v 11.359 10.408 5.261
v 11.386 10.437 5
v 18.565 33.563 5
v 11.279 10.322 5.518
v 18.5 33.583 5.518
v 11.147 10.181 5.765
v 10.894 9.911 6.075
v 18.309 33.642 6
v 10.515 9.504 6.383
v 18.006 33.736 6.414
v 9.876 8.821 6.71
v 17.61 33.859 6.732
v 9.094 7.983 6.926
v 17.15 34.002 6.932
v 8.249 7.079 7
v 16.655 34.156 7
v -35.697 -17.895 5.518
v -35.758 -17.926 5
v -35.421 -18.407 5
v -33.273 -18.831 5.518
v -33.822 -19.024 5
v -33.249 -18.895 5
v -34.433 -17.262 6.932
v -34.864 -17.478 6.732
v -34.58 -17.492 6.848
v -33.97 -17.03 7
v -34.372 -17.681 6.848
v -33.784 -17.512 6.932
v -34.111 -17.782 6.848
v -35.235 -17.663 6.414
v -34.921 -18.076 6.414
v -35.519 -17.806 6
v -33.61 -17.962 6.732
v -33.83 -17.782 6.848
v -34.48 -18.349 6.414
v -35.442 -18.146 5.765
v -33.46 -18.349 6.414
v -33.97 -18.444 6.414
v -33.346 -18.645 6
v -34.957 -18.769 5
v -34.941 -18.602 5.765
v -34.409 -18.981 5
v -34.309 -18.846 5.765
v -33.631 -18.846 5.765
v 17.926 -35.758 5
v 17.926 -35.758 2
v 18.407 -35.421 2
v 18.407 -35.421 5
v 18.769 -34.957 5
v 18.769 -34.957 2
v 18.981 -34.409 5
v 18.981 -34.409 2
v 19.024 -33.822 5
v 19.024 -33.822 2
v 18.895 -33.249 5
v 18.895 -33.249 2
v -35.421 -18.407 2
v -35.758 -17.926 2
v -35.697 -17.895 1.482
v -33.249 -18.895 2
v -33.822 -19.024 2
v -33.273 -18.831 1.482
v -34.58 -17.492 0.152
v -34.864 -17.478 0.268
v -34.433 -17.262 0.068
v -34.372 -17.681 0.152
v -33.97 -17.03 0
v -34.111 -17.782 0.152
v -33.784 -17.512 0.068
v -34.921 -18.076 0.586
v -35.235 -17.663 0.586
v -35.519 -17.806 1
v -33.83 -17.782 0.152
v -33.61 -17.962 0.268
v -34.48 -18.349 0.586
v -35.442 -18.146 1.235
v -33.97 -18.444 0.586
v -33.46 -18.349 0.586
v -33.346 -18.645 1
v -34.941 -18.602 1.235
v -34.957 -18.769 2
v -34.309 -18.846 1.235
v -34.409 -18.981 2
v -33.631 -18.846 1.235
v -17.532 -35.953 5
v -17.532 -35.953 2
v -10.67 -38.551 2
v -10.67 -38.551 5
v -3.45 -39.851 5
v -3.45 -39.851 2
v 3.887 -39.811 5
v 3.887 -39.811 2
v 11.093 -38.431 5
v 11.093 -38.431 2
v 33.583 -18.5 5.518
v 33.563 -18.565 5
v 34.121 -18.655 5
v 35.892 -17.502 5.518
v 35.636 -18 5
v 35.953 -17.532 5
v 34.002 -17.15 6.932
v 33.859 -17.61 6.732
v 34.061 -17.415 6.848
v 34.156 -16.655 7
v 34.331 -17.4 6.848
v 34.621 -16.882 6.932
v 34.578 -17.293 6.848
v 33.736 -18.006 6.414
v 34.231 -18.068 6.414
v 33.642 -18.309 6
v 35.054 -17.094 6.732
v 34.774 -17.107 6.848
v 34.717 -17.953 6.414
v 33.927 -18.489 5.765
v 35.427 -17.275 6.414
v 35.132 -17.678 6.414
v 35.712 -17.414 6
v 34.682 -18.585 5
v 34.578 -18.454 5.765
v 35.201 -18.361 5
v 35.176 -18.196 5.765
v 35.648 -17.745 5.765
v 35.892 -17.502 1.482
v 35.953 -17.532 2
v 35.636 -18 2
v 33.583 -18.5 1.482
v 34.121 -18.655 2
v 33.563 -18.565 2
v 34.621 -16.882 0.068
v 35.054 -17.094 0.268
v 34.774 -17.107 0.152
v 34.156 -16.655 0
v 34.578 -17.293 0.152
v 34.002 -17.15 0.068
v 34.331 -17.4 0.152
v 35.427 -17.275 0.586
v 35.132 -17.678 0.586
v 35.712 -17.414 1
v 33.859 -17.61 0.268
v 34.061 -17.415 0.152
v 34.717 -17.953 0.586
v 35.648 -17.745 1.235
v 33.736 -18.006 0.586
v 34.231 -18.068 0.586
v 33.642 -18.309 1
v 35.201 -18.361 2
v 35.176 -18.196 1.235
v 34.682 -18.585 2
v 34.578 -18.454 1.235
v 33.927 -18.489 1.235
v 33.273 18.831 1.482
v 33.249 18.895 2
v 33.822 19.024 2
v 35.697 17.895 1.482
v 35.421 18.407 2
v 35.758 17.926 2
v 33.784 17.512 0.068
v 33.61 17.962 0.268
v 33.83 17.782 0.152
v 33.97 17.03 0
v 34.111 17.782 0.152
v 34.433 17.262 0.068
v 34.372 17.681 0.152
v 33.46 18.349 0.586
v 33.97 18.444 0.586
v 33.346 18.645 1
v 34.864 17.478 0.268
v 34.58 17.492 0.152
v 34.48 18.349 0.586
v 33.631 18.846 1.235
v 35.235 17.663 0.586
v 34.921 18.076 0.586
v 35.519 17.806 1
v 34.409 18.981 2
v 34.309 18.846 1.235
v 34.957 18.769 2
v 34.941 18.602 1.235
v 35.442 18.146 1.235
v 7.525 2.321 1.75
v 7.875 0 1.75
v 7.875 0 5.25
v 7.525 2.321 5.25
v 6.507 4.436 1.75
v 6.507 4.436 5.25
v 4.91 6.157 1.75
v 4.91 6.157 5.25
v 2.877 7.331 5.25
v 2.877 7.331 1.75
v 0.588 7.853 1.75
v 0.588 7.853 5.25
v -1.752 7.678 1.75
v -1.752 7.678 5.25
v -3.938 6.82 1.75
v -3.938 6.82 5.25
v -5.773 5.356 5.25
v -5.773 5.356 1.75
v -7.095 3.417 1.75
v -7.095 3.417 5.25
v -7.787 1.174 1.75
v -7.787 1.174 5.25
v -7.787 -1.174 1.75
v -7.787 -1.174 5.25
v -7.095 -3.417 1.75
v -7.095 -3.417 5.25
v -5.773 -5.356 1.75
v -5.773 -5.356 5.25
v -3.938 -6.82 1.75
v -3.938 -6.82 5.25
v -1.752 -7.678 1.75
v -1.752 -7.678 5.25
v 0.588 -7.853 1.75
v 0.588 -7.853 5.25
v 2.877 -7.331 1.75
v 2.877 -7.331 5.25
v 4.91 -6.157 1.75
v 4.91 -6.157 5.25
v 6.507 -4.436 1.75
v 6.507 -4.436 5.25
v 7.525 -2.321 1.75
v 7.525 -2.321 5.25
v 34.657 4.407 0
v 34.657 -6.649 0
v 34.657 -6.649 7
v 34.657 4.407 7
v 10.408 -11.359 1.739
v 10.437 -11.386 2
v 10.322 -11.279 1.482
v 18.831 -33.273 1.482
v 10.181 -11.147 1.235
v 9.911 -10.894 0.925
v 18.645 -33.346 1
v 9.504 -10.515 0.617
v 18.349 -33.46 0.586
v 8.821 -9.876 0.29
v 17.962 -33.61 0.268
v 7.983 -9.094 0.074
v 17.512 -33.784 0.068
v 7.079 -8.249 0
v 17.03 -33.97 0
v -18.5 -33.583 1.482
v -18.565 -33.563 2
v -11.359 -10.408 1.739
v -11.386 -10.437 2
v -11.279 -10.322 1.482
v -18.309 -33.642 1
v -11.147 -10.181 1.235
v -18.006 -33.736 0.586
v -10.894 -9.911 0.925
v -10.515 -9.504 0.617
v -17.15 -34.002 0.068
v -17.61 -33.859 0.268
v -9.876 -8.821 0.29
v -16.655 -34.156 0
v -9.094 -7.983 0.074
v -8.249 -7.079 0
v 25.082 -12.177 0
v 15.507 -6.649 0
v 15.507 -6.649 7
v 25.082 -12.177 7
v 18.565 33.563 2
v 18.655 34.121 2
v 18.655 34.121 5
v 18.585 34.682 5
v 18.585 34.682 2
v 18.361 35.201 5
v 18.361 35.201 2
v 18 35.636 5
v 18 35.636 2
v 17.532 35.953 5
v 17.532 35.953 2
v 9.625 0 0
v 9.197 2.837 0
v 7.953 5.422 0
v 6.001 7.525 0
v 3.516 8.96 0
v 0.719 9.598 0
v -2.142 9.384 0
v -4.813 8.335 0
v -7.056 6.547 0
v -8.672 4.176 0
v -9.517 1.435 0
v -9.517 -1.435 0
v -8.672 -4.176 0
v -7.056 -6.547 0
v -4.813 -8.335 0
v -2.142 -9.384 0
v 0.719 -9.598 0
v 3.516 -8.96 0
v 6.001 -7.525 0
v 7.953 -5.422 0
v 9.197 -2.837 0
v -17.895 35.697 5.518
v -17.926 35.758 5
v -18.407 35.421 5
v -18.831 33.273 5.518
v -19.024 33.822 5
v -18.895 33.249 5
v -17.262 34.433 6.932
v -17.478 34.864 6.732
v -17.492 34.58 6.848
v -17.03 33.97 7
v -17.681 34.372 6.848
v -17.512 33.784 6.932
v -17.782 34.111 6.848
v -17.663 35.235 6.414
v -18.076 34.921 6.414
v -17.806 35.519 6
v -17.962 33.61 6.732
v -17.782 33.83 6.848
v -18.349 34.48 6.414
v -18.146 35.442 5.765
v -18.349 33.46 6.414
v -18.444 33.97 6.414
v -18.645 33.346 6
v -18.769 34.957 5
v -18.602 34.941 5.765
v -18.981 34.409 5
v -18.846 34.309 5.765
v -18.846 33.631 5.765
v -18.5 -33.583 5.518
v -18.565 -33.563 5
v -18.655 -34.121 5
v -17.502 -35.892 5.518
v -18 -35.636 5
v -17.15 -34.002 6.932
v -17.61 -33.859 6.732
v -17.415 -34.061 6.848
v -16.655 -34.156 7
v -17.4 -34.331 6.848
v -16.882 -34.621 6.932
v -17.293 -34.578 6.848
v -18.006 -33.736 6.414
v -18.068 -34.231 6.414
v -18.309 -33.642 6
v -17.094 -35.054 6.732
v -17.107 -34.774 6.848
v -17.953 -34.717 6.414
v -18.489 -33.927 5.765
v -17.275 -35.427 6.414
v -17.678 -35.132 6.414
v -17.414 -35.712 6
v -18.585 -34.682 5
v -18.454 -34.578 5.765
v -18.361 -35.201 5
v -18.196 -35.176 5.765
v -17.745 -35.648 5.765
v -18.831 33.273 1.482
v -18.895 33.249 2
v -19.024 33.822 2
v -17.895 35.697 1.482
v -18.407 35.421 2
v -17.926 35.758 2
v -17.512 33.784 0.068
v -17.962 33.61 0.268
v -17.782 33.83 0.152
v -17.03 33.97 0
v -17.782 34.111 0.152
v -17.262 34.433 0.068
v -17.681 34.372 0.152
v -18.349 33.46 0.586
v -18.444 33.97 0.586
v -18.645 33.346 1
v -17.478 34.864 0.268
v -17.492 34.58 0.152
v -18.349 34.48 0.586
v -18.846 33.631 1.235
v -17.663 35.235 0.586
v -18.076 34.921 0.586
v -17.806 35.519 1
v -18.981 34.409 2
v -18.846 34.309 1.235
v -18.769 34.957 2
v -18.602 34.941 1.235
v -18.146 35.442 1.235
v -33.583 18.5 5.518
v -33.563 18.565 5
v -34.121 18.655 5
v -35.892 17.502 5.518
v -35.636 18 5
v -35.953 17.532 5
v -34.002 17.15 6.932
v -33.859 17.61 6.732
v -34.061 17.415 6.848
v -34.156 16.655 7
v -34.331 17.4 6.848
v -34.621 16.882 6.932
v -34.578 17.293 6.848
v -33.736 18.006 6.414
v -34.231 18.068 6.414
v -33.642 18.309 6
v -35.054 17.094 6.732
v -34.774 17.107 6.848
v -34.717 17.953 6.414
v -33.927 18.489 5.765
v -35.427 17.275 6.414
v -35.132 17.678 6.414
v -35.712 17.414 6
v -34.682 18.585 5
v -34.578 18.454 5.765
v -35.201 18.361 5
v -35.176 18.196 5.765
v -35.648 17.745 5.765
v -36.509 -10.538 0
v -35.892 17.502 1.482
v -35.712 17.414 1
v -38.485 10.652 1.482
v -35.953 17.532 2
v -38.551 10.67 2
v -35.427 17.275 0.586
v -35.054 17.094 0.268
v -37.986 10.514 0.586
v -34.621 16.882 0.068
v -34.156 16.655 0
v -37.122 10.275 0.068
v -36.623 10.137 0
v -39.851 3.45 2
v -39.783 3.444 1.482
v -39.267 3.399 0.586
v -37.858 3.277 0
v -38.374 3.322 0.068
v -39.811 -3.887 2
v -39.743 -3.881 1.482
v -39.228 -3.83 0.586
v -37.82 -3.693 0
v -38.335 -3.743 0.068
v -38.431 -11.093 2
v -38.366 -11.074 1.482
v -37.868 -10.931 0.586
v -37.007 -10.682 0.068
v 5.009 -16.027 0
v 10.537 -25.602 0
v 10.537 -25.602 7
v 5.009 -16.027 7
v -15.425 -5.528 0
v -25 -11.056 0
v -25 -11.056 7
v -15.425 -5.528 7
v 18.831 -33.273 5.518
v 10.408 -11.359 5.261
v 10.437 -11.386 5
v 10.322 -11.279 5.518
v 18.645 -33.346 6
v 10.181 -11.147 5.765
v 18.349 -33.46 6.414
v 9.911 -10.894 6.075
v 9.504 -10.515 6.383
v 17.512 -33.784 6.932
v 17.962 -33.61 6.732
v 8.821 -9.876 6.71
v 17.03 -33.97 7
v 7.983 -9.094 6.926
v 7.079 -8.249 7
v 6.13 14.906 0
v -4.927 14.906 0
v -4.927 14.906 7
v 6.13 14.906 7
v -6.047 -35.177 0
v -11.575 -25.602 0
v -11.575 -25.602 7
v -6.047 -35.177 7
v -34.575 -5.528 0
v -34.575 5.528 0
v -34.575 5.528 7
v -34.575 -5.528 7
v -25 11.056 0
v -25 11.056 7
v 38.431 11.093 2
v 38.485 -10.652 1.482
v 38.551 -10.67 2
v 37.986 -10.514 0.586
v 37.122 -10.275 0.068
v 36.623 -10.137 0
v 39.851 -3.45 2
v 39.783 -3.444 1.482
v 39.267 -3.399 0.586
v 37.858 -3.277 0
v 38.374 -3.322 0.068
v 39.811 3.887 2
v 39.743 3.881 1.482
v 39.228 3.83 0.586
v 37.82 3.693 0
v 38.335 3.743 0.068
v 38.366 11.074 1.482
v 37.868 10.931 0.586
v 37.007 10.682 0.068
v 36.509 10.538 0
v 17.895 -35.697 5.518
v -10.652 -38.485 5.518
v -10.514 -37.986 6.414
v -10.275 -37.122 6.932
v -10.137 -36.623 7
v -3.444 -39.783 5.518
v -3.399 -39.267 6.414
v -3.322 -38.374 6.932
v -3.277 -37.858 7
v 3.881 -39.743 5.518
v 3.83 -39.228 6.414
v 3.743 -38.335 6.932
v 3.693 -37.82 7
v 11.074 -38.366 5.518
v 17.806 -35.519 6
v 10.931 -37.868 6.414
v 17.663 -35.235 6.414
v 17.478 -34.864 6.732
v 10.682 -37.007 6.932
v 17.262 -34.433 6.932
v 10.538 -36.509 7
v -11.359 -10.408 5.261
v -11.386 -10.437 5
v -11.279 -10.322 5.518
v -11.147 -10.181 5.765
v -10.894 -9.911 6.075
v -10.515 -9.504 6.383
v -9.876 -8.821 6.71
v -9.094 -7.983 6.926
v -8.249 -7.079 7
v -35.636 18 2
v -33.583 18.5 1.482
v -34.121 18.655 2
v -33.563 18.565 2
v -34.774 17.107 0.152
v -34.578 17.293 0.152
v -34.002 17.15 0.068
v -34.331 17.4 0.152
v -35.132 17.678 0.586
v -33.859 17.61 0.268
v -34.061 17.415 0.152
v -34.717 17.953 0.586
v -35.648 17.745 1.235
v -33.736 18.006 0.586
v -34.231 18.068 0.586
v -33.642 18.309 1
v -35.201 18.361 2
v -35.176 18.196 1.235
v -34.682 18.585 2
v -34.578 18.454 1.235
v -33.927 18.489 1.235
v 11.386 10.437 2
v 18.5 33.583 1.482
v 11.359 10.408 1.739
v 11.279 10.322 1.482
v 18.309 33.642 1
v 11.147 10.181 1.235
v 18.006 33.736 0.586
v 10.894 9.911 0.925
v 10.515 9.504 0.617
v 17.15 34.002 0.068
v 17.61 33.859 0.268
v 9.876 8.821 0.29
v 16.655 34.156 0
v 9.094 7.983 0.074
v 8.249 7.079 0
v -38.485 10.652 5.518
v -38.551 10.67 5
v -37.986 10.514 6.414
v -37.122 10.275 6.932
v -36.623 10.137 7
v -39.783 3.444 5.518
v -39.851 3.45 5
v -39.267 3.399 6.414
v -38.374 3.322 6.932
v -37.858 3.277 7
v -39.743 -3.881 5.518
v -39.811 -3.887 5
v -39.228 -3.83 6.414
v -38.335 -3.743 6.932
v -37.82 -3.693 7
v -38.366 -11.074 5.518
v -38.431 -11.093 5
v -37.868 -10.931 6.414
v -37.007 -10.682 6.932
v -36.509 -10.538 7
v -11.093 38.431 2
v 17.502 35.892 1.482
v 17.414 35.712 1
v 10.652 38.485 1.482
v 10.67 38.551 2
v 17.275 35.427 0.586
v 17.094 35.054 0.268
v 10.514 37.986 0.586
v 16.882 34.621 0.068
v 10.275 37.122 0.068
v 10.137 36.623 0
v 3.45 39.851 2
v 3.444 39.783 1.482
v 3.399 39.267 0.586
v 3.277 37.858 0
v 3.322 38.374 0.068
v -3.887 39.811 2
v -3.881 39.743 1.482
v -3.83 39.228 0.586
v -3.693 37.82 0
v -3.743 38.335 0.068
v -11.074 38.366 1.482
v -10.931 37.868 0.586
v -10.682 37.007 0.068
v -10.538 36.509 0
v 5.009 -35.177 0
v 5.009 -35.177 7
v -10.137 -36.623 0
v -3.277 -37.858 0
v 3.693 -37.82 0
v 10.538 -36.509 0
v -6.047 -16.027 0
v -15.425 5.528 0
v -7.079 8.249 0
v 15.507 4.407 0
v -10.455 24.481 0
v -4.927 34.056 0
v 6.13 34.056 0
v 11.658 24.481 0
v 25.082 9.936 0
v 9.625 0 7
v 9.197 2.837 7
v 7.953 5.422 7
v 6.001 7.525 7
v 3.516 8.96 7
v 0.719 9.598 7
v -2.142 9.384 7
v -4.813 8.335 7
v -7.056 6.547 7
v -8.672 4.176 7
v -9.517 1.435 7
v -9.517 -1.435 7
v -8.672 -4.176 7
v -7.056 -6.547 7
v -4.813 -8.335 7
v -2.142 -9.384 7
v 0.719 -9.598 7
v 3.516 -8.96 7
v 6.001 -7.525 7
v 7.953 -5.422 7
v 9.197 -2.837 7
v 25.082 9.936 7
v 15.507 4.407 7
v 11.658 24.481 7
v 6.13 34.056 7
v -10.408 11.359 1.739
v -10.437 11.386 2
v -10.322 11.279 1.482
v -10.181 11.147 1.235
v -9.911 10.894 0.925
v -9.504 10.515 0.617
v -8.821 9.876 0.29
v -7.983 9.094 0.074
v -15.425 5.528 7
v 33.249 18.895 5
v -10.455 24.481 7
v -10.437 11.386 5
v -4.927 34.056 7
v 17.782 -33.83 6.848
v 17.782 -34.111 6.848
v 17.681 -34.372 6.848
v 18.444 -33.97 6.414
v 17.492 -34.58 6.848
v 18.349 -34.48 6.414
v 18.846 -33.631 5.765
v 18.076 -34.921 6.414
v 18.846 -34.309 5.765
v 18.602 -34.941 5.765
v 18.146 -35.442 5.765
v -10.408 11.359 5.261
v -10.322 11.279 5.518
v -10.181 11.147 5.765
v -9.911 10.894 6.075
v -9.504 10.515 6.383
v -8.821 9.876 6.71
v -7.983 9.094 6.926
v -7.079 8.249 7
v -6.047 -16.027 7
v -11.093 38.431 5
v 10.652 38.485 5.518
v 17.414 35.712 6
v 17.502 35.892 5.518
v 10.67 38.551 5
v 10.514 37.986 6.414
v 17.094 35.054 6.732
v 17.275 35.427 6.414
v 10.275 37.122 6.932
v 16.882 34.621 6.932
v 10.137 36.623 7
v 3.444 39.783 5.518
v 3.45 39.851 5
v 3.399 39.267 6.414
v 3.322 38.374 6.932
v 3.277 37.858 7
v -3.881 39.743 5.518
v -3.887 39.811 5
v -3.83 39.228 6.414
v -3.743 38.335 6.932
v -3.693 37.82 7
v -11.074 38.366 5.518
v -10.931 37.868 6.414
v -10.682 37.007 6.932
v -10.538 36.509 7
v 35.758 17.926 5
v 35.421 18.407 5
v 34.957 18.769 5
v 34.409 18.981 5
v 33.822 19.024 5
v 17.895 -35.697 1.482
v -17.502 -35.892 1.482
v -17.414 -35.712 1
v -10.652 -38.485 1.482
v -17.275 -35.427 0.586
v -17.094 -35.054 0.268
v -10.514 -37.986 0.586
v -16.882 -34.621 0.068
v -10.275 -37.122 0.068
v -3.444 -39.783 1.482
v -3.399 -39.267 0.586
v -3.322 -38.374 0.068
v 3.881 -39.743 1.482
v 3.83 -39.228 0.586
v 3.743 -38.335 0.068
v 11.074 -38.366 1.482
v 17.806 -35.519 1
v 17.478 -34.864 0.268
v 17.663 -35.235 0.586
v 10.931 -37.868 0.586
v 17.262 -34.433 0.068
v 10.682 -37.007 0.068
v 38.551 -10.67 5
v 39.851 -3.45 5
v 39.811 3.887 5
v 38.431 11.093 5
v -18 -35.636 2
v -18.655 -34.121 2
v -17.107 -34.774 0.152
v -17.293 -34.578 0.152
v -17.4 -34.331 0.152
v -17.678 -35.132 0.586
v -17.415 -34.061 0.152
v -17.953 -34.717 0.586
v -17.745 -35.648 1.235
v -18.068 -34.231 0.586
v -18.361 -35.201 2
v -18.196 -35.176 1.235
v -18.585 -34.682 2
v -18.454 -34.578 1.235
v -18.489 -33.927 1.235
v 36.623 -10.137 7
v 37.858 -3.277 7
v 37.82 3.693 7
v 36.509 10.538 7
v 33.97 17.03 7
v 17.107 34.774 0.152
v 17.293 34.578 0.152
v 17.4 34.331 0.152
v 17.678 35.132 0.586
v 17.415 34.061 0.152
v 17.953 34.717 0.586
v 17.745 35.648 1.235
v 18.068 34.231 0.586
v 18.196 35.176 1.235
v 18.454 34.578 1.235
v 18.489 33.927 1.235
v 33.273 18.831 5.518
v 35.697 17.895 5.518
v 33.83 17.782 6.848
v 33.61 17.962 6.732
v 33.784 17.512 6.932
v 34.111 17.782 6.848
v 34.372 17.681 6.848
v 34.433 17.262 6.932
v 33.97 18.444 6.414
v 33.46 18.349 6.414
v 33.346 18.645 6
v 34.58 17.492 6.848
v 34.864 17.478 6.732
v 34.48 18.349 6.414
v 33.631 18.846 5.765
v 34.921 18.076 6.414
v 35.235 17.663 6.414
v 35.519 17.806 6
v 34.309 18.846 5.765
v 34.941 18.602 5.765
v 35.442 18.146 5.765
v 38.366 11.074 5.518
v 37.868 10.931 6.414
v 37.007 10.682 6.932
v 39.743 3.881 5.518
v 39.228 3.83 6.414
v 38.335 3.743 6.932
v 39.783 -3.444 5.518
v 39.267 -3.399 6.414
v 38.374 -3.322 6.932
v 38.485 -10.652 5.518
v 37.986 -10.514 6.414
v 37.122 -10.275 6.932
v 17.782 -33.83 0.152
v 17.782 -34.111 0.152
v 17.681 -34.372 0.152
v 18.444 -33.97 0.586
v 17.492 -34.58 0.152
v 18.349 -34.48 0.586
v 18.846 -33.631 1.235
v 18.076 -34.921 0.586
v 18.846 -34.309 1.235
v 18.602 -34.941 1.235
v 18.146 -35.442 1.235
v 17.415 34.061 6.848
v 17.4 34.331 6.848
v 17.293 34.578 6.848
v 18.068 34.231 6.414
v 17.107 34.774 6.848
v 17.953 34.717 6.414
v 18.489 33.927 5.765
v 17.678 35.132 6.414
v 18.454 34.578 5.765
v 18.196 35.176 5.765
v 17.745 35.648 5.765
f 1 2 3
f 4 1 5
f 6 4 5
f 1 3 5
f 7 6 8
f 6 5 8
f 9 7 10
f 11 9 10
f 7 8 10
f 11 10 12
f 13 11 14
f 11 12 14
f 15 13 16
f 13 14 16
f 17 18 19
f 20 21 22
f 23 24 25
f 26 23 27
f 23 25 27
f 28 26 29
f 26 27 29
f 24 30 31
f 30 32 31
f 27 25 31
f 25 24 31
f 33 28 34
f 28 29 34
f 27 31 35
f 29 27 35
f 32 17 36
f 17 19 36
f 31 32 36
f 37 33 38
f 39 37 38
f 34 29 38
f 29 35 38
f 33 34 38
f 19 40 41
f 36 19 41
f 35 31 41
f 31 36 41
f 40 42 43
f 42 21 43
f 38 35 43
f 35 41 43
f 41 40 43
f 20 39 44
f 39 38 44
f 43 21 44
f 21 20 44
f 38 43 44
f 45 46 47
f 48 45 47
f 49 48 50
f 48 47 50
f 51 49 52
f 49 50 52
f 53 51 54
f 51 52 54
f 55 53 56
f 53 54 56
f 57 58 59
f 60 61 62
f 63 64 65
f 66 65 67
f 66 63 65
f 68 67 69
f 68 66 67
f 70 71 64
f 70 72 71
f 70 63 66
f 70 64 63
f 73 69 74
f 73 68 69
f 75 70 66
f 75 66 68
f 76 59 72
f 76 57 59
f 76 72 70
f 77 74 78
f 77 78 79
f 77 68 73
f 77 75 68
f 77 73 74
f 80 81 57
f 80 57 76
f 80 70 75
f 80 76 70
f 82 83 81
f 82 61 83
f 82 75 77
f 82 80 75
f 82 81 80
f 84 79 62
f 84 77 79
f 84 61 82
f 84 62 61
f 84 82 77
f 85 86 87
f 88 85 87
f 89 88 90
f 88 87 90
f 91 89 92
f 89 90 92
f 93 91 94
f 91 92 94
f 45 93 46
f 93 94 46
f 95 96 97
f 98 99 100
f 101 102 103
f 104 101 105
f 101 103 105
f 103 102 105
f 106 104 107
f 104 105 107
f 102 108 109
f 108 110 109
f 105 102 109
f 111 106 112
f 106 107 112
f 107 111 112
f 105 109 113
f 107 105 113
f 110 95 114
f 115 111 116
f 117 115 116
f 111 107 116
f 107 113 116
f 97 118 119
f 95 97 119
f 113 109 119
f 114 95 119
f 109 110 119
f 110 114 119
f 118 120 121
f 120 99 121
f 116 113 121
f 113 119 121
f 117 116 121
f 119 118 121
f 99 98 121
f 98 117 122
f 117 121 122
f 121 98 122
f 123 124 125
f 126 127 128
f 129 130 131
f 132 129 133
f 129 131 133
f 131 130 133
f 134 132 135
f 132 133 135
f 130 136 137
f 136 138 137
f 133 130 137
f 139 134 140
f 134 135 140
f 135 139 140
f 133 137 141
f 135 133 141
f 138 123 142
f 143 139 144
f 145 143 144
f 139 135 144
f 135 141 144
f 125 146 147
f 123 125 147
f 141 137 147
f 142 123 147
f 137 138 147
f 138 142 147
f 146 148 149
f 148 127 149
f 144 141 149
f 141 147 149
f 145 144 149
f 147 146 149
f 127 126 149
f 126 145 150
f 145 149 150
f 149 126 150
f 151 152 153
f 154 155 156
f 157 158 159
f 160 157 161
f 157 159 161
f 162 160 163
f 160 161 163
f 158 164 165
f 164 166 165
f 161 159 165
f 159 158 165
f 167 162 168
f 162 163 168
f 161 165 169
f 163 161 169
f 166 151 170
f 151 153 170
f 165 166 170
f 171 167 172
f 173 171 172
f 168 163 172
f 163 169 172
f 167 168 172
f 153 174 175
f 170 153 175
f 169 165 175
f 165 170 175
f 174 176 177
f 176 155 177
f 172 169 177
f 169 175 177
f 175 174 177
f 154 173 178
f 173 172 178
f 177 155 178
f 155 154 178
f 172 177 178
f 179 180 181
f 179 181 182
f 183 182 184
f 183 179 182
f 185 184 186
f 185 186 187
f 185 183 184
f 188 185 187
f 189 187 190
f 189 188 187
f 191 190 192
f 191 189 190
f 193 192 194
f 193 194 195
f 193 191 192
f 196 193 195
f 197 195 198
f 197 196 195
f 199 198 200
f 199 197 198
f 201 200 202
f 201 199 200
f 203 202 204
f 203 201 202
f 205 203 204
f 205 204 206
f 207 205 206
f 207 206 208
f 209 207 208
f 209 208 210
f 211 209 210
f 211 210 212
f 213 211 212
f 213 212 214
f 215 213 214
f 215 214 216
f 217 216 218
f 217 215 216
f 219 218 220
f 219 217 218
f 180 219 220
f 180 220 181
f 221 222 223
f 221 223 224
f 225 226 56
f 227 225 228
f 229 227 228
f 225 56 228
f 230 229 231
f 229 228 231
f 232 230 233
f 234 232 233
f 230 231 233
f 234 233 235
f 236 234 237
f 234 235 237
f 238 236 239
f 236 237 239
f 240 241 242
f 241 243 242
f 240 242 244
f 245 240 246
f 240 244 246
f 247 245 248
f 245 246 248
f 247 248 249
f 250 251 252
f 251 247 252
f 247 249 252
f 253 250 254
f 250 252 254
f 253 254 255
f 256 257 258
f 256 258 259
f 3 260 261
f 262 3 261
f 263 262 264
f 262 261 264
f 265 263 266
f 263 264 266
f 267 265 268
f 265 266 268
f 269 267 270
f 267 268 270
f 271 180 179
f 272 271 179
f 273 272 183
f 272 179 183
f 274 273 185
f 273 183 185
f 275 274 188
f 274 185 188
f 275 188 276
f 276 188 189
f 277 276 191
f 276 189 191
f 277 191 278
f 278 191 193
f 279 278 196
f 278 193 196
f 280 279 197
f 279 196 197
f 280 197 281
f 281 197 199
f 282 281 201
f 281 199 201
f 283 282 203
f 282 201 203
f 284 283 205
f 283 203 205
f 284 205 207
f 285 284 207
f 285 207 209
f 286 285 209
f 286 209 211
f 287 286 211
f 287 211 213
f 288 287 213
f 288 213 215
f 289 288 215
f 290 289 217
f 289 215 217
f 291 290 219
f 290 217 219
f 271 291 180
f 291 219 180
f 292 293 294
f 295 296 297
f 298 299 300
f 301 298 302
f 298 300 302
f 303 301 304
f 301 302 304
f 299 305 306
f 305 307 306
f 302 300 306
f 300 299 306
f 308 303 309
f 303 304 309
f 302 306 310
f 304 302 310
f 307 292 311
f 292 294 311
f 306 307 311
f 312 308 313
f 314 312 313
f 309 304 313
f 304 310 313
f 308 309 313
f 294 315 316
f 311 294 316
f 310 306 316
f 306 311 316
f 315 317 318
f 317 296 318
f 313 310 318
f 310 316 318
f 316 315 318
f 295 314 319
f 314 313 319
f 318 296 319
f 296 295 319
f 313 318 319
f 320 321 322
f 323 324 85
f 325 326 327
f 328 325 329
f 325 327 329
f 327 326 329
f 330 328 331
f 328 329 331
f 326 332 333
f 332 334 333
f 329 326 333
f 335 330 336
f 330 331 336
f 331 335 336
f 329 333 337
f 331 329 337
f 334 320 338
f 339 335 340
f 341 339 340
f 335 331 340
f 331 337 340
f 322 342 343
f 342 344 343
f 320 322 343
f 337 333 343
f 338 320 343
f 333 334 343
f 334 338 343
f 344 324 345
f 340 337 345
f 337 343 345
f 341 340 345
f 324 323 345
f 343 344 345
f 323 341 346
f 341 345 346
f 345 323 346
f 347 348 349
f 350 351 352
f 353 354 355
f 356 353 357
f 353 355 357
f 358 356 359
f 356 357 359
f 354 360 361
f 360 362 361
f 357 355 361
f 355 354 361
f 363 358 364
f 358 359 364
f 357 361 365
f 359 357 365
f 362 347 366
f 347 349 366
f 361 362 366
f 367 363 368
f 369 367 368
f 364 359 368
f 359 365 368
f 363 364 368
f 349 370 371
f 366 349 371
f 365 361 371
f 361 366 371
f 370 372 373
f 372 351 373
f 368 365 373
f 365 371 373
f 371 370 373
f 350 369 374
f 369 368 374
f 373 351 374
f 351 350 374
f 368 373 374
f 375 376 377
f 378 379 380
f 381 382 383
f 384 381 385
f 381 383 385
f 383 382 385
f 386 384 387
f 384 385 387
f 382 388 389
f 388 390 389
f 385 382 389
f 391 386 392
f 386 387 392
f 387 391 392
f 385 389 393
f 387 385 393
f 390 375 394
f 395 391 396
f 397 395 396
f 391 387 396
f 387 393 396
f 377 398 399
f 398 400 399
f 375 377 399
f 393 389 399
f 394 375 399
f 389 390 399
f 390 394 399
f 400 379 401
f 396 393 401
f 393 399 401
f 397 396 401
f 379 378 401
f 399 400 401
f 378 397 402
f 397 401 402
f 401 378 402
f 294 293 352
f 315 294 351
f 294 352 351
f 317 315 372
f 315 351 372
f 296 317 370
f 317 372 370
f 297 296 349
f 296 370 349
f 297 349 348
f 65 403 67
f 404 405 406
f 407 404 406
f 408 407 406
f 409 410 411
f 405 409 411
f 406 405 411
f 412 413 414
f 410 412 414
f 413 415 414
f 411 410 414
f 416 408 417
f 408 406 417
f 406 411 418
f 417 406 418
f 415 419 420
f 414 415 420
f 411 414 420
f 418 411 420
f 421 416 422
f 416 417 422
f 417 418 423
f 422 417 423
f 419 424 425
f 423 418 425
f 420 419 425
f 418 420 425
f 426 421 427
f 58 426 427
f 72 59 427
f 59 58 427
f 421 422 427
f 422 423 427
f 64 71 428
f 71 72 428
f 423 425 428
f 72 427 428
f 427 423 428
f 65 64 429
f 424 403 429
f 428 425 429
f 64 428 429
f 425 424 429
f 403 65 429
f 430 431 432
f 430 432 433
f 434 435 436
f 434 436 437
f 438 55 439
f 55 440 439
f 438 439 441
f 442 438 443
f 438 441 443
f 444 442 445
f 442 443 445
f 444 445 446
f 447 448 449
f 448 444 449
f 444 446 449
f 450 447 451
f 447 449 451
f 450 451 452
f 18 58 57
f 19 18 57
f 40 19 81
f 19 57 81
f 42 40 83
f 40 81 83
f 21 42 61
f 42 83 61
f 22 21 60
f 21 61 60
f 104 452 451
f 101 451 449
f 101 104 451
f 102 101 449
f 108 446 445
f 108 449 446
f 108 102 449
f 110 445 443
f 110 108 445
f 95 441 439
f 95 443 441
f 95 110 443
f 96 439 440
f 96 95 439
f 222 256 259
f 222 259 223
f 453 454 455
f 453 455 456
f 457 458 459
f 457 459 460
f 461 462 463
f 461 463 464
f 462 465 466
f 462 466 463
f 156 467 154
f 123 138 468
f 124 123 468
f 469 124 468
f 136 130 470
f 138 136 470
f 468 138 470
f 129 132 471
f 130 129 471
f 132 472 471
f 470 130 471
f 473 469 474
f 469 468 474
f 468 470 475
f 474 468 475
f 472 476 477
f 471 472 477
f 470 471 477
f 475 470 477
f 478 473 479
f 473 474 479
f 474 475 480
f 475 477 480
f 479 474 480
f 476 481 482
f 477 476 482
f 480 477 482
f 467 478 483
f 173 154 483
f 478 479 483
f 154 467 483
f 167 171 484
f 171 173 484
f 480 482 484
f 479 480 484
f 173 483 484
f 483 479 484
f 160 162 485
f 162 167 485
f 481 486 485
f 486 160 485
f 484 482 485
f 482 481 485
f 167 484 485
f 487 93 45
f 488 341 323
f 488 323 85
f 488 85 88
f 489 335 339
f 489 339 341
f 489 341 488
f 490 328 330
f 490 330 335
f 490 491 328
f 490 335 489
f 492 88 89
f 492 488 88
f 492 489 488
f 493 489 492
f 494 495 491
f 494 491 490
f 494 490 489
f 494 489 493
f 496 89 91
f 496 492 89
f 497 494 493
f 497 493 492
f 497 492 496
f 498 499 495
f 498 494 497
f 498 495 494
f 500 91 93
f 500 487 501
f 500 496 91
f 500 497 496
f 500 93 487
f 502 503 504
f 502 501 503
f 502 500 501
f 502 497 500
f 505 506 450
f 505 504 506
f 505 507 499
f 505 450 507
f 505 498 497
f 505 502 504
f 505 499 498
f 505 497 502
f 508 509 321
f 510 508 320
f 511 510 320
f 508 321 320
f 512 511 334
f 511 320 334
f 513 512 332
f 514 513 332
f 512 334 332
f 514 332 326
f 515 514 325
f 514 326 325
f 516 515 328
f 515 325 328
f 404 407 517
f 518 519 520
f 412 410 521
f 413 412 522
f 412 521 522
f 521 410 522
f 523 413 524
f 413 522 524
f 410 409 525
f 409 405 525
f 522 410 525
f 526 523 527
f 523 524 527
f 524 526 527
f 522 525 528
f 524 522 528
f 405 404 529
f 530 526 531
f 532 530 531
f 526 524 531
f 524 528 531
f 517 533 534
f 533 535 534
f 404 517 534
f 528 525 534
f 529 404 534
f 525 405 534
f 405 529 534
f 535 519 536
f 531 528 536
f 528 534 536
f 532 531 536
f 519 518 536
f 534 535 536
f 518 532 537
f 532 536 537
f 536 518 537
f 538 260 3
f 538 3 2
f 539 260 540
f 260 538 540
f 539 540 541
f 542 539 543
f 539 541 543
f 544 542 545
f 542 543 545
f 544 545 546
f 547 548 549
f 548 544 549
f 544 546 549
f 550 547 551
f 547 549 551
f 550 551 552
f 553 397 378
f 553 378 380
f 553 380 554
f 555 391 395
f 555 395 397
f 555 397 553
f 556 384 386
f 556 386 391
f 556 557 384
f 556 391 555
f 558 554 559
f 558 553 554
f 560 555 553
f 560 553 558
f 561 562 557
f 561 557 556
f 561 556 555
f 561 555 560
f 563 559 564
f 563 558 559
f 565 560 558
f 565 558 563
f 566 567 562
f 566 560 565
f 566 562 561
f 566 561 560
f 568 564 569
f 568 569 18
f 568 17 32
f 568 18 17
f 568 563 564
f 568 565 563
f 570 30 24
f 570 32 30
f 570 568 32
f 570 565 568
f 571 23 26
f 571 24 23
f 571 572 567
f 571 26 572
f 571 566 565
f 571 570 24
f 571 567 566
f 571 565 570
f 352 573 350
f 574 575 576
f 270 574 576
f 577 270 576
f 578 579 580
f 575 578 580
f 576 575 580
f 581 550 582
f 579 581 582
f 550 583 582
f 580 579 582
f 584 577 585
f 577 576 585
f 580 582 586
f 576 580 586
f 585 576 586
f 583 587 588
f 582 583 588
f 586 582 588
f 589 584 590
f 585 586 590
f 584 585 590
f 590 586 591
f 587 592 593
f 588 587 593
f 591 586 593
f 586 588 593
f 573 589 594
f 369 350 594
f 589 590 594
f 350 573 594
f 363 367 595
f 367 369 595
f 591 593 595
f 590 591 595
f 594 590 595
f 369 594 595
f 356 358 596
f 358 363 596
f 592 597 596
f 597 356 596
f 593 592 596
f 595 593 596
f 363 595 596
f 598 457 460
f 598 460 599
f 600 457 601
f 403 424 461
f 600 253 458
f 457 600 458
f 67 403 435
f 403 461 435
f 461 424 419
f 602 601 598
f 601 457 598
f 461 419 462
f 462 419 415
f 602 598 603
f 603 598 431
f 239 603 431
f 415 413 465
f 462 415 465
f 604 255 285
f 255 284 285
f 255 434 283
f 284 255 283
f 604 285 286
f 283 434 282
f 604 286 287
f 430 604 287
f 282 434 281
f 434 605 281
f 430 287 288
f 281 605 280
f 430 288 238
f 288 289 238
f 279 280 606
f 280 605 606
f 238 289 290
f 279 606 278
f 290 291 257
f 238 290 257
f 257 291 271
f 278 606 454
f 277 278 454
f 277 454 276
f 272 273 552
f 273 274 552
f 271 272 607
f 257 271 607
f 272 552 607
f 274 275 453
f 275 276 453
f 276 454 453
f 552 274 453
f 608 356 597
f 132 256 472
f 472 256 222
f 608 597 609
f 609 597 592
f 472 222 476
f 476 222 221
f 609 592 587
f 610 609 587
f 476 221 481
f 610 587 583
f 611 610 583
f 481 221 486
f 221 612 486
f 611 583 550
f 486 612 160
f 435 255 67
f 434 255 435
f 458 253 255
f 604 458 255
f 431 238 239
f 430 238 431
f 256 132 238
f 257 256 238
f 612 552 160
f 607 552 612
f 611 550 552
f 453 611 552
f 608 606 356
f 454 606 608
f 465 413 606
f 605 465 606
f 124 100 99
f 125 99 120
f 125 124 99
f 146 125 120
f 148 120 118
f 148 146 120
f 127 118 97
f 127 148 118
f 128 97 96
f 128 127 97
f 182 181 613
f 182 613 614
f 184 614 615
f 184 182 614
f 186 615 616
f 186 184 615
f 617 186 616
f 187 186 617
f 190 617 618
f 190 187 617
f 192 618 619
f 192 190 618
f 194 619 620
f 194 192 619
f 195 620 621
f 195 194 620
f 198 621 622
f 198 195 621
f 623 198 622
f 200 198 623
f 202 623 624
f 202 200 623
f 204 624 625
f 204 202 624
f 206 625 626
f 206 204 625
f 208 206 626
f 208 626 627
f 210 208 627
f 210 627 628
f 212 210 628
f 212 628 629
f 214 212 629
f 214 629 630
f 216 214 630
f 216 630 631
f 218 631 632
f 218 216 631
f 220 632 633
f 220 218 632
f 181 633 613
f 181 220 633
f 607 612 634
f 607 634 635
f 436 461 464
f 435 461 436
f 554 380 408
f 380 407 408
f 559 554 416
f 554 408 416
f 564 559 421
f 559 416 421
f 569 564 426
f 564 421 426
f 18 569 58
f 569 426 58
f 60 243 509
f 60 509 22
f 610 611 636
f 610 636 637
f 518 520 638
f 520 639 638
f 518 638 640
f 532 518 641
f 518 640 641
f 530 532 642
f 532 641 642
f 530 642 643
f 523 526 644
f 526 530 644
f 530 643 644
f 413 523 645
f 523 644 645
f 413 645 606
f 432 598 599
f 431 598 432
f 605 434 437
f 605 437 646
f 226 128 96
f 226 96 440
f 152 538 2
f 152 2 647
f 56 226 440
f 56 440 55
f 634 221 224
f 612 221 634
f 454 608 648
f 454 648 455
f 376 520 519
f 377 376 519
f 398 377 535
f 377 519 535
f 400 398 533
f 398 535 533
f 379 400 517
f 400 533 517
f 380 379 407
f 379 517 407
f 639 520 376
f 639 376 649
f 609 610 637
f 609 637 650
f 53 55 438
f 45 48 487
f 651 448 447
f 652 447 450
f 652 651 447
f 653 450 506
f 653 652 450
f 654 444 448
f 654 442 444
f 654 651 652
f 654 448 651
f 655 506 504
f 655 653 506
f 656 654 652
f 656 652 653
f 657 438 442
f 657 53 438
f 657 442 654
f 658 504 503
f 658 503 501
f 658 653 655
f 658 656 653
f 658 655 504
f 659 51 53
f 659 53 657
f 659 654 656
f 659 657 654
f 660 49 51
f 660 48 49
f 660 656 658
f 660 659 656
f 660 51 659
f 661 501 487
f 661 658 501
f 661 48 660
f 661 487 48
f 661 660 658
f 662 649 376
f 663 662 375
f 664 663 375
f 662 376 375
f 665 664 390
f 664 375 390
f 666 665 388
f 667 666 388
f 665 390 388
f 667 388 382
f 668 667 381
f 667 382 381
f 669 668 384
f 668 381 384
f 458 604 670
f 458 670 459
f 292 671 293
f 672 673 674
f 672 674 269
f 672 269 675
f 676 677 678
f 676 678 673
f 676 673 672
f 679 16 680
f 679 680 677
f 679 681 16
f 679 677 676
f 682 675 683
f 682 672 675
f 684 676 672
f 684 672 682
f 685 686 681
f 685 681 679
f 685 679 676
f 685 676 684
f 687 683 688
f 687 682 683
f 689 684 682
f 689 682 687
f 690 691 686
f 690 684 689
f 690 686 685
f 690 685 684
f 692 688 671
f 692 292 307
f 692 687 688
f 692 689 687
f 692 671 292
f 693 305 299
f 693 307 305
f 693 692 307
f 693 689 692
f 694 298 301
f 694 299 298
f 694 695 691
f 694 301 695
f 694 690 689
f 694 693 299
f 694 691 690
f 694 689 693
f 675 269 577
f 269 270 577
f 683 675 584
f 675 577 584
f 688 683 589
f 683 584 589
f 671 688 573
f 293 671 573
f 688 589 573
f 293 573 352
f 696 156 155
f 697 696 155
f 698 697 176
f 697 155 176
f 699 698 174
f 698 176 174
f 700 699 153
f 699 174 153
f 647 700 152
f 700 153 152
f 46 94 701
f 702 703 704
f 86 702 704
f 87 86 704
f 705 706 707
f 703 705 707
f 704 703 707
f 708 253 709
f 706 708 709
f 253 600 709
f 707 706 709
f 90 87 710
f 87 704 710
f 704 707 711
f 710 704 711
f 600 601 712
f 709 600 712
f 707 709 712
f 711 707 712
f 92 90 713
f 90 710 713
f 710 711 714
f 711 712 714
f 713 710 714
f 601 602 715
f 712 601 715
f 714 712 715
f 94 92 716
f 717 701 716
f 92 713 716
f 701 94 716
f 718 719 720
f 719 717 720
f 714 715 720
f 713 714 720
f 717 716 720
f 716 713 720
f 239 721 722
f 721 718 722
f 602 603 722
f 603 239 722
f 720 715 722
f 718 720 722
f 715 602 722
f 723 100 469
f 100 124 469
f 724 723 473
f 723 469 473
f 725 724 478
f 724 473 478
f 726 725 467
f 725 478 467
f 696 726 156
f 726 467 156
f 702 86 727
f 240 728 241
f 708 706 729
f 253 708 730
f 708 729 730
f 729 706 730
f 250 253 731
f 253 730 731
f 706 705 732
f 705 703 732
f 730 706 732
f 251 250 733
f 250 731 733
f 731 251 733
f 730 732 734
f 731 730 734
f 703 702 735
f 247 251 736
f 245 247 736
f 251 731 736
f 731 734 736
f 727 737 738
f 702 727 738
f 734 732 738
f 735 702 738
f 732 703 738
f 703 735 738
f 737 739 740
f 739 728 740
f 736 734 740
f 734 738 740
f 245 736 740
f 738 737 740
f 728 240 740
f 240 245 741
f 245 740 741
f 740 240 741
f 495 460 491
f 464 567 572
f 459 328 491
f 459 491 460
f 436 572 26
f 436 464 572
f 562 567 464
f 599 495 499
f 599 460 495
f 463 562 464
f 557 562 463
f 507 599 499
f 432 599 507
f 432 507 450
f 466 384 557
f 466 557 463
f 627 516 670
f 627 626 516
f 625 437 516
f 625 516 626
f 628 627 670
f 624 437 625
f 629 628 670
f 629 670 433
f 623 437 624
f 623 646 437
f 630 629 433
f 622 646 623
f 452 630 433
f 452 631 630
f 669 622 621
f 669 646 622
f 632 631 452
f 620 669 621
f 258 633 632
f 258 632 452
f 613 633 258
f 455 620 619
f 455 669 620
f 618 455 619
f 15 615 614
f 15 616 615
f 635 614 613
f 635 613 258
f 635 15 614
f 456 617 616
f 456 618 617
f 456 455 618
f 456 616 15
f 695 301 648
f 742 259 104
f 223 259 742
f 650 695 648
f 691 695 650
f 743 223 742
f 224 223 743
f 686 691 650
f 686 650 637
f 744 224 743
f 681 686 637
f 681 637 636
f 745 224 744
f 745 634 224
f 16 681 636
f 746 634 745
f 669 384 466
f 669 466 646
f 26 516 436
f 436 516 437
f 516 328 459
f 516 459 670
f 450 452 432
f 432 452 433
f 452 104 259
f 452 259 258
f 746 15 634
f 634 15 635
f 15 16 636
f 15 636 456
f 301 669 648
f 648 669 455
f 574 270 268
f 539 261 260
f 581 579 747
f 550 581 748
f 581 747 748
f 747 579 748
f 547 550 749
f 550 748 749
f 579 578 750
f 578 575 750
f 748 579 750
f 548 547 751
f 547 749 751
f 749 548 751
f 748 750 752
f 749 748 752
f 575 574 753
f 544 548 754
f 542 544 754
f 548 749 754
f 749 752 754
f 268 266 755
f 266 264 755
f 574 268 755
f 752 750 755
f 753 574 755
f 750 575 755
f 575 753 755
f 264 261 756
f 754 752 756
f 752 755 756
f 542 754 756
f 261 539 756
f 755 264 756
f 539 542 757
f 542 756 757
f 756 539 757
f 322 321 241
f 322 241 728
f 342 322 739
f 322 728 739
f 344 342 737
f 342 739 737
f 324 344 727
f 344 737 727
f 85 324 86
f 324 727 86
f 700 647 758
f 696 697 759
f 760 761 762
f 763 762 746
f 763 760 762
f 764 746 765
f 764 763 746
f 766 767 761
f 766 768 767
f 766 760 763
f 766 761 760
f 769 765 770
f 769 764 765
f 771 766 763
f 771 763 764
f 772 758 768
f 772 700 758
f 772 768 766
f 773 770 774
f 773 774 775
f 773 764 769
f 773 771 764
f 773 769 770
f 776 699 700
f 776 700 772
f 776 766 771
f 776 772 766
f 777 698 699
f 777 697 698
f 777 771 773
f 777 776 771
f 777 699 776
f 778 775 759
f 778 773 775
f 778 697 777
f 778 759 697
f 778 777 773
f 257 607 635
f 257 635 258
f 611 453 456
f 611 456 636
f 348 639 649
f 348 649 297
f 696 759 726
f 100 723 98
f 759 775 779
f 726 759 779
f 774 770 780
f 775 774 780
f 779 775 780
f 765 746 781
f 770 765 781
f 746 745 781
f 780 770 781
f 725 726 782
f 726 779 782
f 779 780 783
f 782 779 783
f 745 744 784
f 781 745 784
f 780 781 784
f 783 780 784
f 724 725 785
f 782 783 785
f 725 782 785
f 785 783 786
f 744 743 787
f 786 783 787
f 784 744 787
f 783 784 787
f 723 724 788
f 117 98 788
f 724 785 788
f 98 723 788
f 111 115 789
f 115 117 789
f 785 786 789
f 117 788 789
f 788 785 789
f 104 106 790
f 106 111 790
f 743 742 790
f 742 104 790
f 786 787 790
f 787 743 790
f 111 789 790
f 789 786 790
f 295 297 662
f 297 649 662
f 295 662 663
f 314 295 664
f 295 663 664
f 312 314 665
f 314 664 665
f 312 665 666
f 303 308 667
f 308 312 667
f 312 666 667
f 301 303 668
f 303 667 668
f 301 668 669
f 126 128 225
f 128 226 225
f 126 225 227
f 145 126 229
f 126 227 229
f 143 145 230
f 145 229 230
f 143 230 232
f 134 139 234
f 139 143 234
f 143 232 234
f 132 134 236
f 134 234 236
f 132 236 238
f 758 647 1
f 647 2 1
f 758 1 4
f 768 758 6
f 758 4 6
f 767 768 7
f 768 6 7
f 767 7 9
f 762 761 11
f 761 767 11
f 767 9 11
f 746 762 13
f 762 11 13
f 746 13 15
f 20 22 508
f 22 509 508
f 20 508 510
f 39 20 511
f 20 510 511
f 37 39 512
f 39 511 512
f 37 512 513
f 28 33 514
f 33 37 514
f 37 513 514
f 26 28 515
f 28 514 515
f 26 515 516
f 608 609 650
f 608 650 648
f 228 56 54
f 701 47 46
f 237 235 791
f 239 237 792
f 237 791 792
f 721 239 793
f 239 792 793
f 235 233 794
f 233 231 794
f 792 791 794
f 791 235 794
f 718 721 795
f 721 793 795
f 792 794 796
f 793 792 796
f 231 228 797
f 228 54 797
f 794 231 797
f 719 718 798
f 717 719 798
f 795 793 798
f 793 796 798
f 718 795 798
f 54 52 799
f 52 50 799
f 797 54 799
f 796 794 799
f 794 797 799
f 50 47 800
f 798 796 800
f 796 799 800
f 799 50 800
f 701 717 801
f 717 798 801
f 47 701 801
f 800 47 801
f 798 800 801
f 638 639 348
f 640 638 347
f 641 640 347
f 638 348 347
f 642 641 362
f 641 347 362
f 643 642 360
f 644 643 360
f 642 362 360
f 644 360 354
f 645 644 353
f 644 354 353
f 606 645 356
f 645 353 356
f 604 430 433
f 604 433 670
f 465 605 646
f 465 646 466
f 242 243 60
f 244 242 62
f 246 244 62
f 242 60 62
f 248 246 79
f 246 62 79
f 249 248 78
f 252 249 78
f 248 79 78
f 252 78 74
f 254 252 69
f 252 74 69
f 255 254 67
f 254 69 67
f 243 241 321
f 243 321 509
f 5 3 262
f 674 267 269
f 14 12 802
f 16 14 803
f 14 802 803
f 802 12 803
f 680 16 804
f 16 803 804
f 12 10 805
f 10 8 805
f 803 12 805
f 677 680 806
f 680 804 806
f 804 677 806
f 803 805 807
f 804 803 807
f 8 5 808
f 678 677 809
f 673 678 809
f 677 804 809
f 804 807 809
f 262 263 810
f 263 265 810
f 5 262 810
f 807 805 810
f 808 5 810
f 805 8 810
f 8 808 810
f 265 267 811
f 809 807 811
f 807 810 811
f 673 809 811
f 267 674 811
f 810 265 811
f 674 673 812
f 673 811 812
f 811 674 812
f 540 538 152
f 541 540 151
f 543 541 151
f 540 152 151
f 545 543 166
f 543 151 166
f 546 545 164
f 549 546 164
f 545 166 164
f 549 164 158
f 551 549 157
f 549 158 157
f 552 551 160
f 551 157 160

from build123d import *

# Parameters (mm, degrees)
F0_R     = 40
F0_R_2   = 7.875
F1_DEPTH = 7
F3_DEPTH = 7.001
F5_DEPTH = 7.001
F6_R     = 2
F7_SIZE  = 1.75


with BuildPart() as f1:
    # F0 (on Top) → F1 (new body)
    with BuildSketch(Plane.XY):
        Circle(F0_R)
        Circle(F0_R_2, mode=Mode.SUBTRACT)
    extrude(amount=F1_DEPTH)

    # F2 (on Top) → F3 (cut, through all)
    with BuildSketch(Plane.XY):
        Polygon((-24.9999994913, -11.056257655), (-15.4249997457, -5.528128387), (-15.4250002543, 5.528129268), (-25.0000005087, 11.056257655), (-34.5750002543, 5.528128387), (-34.5749997457, -5.528129268), align=None)
        Polygon((-6.0472384723, -16.0265521064), (-11.5753668593, -25.6015523607), (-6.0472375913, -35.1765521064), (5.0090200637, -35.1765515977), (10.5371484507, -25.6015513433), (5.0090191826, -16.0265515977), align=None)
        Polygon((15.507442902, -6.6487903244), (25.0824431564, -12.1769187113), (34.657442902, -6.6487894433), (34.6574423934, 4.4074682117), (25.082442139, 9.9355965986), (15.5074423934, 4.4074673306), align=None)
        Polygon((6.12968112, 14.90589105), (11.657809507, 24.4808913044), (6.129680239, 34.05589105), (-4.926577416, 34.0558905413), (-10.454705803, 24.480890287), (-4.9265765349, 14.9058905413), align=None)
    extrude(amount=F3_DEPTH, mode=Mode.SUBTRACT)

    # F4 (on Top) → F5 (cut, through all)
    with BuildSketch(Plane.XY):
        Polygon((-10.4367481545, 11.3855423406), (-19.5796824992, 35.0191704929), (-58.221526444, 26.2212492526), align=None)
        Polygon((-35.0191704929, -19.5796824992), (-26.2212492526, -58.221526444), (-11.3855423406, -10.4367481545), align=None)
        Polygon((19.5796824992, -35.0191704929), (58.221526444, -26.2212492526), (10.4367481545, -11.3855423406), align=None)
        Polygon((35.0191704929, 19.5796824992), (26.2212492526, 58.221526444), (11.3855423406, 10.4367481545), align=None)
    extrude(amount=F5_DEPTH, mode=Mode.SUBTRACT)

    # F6
    f6_edges = [f1.edges().sort_by_distance(p)[0] for p in [
        (-22.801047, 15.224278, 7),
        (-39.999091, -0.269736, 7),
        (-23.145299, -14.986142, 7),
        (-15.224278, -22.801047, 7),
        (14.986142, -23.145299, 7),
        (22.801047, -15.224278, 7),
        (23.145299, 14.986142, 7),
        (39.999091, 0.269736, 7),
        (15.224278, 22.801047, 7),
        (-0.269736, 39.999091, 7),
        (-14.986142, 23.145299, 7),
        (-39.999091, -0.269736, 0),
        (-22.801047, 15.224278, 0),
        (-14.986142, 23.145299, 0),
        (-0.269736, 39.999091, 0),
        (15.224278, 22.801047, 0),
        (23.145299, 14.986142, 0),
        (39.999091, 0.269736, 0),
        (22.801047, -15.224278, 0),
        (14.986142, -23.145299, 0),
        (0.269736, -39.999091, 0),
        (-15.224278, -22.801047, 0),
        (-23.145299, -14.986142, 0),
        (0.269736, -39.999091, 7),
        (19.535536, -34.905055, 3.5),
        (-19.063013, -35.165346, 3.5),
        (-34.905055, -19.535536, 3.5),
        (-35.165346, 19.063013, 3.5),
        (-19.535536, 34.905055, 3.5),
        (19.063013, 35.165346, 3.5),
        (34.905055, 19.535536, 3.5),
        (35.165346, -19.063013, 3.5),
    ]]
    fillet(f6_edges, radius=F6_R)

    # F7
    f7_edges = [f1.edges().sort_by_distance(p)[0] for p in [
        (-7.875, 0, 7),
        (-7.875, 0, 0),
    ]]
    chamfer(f7_edges, length=F7_SIZE)


solid = f1.part
